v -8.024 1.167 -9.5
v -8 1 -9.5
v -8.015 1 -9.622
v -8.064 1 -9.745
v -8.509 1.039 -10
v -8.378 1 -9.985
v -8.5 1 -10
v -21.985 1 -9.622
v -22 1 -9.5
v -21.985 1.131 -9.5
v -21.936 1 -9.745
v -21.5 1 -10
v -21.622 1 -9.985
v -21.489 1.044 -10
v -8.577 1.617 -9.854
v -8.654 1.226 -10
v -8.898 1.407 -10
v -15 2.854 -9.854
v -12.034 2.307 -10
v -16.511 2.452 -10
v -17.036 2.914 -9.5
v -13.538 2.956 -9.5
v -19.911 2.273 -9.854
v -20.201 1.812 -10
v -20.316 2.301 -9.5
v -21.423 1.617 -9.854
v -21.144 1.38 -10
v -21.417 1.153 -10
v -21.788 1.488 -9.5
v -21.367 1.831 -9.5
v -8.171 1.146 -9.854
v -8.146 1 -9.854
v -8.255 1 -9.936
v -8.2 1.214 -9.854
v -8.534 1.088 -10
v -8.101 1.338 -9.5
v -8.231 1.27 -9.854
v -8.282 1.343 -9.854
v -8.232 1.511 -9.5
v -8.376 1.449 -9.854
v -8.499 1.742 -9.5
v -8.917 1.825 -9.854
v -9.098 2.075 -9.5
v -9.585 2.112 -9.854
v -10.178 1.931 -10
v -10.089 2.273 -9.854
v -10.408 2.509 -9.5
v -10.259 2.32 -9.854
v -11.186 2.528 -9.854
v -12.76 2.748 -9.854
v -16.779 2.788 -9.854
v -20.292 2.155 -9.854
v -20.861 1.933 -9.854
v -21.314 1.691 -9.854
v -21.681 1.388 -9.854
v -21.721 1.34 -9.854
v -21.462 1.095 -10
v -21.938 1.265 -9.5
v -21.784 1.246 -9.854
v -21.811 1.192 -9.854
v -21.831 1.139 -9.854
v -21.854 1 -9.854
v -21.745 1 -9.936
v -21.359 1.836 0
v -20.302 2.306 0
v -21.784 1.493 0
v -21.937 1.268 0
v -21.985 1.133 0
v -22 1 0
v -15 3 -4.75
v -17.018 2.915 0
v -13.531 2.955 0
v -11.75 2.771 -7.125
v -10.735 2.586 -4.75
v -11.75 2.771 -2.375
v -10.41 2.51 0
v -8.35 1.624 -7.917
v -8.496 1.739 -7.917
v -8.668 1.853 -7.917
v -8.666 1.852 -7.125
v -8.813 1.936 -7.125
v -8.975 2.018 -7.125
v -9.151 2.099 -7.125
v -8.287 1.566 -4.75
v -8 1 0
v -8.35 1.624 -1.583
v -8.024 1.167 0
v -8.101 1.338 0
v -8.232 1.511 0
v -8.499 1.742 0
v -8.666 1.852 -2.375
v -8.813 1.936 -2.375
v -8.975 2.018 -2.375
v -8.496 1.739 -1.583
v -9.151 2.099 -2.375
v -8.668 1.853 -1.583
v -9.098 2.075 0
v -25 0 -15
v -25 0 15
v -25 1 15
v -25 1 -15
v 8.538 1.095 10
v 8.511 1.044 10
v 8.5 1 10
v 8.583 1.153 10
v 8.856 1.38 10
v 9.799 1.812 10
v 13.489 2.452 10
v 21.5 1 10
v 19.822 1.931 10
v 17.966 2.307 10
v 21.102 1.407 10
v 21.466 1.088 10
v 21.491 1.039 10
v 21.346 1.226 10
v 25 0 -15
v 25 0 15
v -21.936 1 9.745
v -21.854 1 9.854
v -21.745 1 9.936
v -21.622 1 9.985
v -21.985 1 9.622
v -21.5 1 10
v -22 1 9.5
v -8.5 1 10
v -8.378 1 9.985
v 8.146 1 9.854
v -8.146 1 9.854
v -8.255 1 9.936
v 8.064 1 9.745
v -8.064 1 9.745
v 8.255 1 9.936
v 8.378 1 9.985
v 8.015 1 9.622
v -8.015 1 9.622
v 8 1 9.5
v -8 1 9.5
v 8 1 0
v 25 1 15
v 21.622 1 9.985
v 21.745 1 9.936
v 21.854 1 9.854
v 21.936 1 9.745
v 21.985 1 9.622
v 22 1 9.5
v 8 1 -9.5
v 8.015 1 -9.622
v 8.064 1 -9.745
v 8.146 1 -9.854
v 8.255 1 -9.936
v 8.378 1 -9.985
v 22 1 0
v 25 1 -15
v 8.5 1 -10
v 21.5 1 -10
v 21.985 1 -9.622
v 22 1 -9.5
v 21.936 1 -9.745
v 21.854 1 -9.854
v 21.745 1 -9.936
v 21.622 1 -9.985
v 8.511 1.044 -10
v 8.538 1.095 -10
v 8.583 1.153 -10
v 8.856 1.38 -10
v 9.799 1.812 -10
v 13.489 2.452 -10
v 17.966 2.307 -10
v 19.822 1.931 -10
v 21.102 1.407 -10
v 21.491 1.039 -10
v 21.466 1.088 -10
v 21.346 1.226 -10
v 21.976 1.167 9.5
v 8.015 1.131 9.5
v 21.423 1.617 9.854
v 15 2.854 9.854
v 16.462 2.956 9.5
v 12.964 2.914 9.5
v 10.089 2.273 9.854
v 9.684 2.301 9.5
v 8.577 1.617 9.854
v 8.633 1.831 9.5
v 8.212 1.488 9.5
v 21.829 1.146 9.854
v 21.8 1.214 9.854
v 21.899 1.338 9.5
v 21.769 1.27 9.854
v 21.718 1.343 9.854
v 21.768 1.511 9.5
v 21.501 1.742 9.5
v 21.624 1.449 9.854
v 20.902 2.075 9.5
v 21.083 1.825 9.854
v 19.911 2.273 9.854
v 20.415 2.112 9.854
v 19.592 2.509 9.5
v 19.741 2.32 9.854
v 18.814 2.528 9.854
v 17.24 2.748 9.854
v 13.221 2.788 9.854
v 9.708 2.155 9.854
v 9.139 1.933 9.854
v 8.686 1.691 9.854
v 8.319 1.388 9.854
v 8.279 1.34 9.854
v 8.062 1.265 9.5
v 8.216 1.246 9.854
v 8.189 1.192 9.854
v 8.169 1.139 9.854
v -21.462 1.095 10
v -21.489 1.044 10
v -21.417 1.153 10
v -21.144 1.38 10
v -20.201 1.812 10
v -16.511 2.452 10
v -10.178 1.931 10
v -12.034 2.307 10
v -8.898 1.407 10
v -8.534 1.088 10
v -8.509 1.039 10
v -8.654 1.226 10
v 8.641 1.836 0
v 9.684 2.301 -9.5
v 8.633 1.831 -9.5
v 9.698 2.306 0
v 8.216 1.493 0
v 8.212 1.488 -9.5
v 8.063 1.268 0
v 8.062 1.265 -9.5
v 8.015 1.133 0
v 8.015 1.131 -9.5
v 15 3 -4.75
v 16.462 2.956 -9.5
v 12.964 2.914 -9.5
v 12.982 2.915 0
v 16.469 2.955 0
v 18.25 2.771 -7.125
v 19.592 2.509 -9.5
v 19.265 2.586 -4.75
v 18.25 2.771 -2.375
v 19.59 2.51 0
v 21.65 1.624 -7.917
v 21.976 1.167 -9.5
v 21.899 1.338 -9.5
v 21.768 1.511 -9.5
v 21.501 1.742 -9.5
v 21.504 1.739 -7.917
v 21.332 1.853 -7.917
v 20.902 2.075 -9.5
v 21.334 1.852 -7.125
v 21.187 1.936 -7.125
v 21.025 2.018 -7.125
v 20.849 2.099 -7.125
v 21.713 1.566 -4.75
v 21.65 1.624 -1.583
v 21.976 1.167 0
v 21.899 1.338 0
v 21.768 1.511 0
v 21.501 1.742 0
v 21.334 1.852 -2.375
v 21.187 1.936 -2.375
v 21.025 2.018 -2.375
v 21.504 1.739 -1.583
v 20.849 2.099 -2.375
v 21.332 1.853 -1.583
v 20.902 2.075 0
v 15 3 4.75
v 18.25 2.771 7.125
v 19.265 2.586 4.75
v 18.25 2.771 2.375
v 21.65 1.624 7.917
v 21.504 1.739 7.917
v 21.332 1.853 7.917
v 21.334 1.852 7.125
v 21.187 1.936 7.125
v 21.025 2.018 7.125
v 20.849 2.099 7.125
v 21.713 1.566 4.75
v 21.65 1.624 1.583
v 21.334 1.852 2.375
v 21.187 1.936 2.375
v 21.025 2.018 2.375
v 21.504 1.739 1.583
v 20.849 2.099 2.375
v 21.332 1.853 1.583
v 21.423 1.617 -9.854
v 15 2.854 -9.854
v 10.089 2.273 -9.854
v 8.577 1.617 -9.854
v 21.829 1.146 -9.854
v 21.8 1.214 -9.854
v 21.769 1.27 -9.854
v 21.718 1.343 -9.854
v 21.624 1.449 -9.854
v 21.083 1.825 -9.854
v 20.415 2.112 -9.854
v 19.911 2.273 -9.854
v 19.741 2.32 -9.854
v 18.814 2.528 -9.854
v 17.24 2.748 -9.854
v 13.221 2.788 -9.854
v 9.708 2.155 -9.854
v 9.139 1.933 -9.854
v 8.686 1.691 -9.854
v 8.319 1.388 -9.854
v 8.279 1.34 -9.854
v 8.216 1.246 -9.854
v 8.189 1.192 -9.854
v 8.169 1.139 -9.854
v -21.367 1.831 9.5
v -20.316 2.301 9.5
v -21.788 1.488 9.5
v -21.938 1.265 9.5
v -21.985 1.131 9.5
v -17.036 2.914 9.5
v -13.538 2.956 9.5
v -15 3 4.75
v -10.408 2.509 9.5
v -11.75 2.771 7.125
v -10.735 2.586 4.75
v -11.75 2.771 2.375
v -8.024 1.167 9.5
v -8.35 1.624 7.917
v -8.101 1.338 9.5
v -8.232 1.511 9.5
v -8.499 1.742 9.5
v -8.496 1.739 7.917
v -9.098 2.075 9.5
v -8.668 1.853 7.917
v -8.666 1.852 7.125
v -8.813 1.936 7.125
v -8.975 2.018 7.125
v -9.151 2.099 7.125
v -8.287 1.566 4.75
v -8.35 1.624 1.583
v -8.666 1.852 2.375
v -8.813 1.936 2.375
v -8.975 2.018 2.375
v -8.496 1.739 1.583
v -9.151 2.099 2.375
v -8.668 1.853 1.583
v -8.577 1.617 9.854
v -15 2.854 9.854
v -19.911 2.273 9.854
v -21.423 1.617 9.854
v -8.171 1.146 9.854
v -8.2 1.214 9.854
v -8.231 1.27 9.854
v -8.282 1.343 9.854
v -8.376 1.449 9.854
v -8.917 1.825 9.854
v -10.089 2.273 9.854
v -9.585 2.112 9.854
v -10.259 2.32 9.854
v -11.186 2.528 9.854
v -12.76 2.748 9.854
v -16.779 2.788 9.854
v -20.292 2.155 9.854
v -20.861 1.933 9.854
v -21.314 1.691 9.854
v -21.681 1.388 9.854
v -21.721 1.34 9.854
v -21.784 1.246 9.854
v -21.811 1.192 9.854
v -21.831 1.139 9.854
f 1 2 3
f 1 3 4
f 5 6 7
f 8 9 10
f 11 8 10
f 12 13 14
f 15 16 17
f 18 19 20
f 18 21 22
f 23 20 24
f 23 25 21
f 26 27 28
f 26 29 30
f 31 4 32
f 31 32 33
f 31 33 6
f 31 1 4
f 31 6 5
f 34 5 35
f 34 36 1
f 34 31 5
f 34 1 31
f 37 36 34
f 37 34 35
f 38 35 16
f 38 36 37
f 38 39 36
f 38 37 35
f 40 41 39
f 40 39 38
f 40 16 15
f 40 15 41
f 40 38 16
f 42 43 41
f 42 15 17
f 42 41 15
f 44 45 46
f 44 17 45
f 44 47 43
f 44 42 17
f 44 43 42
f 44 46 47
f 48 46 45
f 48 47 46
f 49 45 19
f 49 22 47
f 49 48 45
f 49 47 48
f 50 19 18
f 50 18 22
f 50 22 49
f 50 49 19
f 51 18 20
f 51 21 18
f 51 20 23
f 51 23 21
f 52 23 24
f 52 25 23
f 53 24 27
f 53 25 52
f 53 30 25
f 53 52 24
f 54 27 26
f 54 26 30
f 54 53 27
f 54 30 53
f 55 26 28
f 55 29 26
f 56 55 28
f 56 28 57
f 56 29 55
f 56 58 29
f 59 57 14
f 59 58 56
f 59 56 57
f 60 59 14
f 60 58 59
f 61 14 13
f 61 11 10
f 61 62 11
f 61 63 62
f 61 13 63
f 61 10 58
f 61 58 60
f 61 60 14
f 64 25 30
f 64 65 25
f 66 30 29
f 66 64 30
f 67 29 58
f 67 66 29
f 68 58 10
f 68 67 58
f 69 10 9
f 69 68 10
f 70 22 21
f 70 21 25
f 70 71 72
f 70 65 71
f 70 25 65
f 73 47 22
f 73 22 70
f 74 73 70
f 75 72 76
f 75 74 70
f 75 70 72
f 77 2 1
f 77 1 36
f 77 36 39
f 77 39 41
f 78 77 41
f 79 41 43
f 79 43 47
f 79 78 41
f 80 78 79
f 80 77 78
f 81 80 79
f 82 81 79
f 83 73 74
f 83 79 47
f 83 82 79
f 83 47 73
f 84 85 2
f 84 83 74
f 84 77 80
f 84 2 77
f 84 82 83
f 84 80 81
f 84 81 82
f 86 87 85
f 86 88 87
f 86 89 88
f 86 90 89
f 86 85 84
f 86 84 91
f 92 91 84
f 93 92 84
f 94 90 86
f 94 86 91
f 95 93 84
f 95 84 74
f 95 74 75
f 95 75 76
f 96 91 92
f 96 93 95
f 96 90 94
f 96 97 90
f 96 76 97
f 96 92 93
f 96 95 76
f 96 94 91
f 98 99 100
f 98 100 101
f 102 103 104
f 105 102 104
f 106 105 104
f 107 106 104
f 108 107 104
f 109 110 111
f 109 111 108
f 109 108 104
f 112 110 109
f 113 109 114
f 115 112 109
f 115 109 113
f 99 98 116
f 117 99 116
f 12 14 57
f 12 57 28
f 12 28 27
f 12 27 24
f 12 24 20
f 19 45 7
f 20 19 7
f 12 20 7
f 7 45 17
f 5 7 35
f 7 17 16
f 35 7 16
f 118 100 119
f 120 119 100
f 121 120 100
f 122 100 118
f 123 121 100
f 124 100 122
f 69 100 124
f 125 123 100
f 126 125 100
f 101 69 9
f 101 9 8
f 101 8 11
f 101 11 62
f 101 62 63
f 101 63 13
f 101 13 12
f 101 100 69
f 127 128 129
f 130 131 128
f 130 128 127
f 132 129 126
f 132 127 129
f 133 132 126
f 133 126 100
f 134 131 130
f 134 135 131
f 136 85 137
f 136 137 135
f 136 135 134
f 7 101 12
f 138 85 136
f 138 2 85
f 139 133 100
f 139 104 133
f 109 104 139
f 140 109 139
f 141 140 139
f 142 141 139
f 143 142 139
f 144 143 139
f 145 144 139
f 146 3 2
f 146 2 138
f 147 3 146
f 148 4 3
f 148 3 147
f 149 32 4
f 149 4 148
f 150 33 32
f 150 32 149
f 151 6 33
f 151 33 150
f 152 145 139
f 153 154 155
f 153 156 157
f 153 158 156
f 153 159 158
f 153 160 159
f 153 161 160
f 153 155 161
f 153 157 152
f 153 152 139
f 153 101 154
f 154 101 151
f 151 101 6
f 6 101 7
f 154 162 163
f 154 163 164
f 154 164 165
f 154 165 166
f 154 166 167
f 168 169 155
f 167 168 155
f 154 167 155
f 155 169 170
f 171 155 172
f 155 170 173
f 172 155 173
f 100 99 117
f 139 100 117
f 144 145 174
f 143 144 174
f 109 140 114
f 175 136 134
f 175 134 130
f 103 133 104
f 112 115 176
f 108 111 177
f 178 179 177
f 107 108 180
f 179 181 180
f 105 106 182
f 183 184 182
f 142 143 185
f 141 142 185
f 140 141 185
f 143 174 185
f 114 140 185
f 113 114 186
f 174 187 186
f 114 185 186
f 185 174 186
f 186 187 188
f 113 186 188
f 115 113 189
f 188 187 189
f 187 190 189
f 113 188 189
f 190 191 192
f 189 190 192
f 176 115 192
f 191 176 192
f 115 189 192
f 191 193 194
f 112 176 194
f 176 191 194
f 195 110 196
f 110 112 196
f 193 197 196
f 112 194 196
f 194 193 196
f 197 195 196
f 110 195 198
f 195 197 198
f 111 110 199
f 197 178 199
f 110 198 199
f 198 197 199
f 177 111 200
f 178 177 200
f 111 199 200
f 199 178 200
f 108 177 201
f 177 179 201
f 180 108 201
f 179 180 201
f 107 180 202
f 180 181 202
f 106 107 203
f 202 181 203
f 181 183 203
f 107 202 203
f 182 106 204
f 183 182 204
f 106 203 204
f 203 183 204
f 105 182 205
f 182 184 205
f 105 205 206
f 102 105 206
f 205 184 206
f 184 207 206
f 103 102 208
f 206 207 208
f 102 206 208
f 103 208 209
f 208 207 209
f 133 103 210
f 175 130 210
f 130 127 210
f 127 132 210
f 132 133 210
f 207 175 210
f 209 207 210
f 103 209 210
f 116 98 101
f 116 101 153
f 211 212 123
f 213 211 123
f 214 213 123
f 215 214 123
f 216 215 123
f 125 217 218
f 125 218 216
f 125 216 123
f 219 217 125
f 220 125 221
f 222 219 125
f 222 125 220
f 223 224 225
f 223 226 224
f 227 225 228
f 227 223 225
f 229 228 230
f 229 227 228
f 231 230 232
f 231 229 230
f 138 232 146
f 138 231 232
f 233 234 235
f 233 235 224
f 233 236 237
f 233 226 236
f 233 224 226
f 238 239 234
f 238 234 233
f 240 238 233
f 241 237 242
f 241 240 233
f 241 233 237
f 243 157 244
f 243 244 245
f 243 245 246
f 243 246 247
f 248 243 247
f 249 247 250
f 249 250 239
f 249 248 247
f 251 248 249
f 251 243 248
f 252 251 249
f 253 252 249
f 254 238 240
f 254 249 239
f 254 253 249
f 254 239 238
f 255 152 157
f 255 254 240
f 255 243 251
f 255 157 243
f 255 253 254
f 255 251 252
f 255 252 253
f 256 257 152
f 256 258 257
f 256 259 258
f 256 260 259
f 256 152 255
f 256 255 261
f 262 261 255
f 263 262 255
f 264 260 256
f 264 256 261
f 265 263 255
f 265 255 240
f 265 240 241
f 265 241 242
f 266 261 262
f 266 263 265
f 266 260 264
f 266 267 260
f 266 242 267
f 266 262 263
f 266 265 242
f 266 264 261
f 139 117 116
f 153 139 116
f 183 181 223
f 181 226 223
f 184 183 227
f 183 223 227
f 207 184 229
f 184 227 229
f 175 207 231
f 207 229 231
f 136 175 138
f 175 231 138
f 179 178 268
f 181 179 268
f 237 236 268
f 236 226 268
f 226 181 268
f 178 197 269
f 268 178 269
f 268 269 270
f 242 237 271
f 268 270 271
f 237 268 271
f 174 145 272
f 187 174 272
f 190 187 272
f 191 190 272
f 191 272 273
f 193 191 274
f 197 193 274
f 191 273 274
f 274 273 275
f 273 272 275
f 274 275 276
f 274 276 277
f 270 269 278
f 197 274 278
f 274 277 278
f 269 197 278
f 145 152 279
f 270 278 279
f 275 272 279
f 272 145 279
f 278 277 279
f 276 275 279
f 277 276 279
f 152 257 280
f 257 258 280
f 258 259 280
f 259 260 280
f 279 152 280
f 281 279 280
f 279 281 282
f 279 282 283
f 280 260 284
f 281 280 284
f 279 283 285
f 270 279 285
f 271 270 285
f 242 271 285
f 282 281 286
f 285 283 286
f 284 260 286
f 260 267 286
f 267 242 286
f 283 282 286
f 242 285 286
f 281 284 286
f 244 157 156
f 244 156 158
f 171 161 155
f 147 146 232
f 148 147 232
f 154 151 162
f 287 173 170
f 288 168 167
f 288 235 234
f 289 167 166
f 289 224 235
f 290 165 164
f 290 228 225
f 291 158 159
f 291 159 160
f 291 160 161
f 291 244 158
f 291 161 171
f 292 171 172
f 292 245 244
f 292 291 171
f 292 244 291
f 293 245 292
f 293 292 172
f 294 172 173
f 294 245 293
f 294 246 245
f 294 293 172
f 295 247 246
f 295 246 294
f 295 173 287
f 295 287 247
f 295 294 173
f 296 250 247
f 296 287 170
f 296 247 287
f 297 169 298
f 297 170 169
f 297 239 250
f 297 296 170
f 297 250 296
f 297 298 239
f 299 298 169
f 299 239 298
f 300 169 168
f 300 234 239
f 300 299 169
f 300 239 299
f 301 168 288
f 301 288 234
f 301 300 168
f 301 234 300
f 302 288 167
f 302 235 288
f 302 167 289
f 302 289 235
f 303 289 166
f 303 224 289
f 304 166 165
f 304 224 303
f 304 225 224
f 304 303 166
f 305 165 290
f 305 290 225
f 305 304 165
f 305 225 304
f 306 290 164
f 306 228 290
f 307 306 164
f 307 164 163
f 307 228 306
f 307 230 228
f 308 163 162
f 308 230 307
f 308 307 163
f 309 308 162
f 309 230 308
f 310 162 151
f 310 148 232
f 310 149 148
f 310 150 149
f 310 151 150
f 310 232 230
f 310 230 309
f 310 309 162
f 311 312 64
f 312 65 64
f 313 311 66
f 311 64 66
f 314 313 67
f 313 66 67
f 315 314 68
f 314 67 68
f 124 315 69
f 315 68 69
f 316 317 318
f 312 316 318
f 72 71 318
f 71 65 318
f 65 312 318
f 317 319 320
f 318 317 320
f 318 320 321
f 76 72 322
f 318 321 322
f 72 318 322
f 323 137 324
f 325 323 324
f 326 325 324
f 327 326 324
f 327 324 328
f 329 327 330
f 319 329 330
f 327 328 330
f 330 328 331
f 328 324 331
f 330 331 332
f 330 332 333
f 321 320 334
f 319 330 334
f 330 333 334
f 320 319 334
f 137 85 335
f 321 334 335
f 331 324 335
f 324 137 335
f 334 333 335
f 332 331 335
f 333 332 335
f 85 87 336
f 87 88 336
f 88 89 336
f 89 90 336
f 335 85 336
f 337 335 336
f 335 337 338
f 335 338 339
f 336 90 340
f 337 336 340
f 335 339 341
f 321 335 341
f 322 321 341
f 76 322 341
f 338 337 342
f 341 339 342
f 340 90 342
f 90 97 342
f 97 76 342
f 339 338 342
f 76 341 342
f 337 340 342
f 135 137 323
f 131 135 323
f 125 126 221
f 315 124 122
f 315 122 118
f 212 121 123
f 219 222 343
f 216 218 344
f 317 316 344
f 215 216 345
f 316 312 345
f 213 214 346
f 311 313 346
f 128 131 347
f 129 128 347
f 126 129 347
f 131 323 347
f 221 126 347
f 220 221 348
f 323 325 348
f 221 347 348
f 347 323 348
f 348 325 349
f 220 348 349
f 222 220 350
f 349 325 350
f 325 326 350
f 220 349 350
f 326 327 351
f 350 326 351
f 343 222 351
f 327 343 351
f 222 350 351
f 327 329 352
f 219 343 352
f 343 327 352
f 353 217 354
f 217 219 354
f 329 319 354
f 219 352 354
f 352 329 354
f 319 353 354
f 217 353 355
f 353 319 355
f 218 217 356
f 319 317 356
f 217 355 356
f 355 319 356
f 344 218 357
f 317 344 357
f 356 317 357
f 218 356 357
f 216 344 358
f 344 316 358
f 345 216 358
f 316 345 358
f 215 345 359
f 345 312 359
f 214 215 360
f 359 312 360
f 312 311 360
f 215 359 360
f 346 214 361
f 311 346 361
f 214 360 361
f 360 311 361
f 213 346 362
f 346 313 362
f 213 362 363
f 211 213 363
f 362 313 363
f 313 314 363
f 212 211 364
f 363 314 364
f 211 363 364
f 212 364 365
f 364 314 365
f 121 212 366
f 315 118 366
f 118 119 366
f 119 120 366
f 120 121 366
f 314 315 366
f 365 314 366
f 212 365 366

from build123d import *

# Parameters (mm, degrees)
SKETCH_1_W      = 50
SKETCH_1_H      = 30
EXTRUDE_1_DEPTH = 1
EXTRUDE_2_DEPTH = 10
FILLET_2_R      = 0.5


with BuildPart() as part:
    # Эскиз1 → Бобышка-Вытянуть1 (new body)
    with BuildSketch(Plane(origin=(0, 0, 0), x_dir=(1, 0, 0), z_dir=(0, 1, 0))):
        Rectangle(SKETCH_1_W, SKETCH_1_H)
    extrude(amount=EXTRUDE_1_DEPTH)

    # Эскиз2 → Бобышка-Вытянуть2 (add, symmetric)
    with BuildSketch(Plane.XY):
        with BuildLine():
            Line((-22, 1), (-8, 1))
            add(Edge.make_bspline(
                [(-8, 1), (-8, 3), (-15, 3), (-22, 3), (-22, 1)],
                knots=[0, 0, 0, 1.570796327, 1.570796327, 3.141592654, 3.141592654, 3.141592654], degree=2, weights=[1, 0.707106781, 1, 0.707106781, 1]))
        make_face()
        with BuildLine():
            Line((8, 1), (22, 1))
            add(Edge.make_bspline(
                [(22, 1), (22, 3), (15, 3), (8, 3), (8, 1)],
                knots=[3.141592654, 3.141592654, 3.141592654, 4.71238898, 4.71238898, 6.283185307, 6.283185307, 6.283185307], degree=2, weights=[1, 0.707106781, 1, 0.707106781, 1]))
        make_face()
    extrude(amount=EXTRUDE_2_DEPTH, both=True)

    # Скругление2
    fillet_2_edges = [part.edges().sort_by_distance(p)[0] for p in [
        (-15, 3, -10),
        (-15, 3, 10),
        (15, 3, -10),
        (15, 3, 10),
    ]]
    fillet(fillet_2_edges, radius=FILLET_2_R)


solid = part.part
